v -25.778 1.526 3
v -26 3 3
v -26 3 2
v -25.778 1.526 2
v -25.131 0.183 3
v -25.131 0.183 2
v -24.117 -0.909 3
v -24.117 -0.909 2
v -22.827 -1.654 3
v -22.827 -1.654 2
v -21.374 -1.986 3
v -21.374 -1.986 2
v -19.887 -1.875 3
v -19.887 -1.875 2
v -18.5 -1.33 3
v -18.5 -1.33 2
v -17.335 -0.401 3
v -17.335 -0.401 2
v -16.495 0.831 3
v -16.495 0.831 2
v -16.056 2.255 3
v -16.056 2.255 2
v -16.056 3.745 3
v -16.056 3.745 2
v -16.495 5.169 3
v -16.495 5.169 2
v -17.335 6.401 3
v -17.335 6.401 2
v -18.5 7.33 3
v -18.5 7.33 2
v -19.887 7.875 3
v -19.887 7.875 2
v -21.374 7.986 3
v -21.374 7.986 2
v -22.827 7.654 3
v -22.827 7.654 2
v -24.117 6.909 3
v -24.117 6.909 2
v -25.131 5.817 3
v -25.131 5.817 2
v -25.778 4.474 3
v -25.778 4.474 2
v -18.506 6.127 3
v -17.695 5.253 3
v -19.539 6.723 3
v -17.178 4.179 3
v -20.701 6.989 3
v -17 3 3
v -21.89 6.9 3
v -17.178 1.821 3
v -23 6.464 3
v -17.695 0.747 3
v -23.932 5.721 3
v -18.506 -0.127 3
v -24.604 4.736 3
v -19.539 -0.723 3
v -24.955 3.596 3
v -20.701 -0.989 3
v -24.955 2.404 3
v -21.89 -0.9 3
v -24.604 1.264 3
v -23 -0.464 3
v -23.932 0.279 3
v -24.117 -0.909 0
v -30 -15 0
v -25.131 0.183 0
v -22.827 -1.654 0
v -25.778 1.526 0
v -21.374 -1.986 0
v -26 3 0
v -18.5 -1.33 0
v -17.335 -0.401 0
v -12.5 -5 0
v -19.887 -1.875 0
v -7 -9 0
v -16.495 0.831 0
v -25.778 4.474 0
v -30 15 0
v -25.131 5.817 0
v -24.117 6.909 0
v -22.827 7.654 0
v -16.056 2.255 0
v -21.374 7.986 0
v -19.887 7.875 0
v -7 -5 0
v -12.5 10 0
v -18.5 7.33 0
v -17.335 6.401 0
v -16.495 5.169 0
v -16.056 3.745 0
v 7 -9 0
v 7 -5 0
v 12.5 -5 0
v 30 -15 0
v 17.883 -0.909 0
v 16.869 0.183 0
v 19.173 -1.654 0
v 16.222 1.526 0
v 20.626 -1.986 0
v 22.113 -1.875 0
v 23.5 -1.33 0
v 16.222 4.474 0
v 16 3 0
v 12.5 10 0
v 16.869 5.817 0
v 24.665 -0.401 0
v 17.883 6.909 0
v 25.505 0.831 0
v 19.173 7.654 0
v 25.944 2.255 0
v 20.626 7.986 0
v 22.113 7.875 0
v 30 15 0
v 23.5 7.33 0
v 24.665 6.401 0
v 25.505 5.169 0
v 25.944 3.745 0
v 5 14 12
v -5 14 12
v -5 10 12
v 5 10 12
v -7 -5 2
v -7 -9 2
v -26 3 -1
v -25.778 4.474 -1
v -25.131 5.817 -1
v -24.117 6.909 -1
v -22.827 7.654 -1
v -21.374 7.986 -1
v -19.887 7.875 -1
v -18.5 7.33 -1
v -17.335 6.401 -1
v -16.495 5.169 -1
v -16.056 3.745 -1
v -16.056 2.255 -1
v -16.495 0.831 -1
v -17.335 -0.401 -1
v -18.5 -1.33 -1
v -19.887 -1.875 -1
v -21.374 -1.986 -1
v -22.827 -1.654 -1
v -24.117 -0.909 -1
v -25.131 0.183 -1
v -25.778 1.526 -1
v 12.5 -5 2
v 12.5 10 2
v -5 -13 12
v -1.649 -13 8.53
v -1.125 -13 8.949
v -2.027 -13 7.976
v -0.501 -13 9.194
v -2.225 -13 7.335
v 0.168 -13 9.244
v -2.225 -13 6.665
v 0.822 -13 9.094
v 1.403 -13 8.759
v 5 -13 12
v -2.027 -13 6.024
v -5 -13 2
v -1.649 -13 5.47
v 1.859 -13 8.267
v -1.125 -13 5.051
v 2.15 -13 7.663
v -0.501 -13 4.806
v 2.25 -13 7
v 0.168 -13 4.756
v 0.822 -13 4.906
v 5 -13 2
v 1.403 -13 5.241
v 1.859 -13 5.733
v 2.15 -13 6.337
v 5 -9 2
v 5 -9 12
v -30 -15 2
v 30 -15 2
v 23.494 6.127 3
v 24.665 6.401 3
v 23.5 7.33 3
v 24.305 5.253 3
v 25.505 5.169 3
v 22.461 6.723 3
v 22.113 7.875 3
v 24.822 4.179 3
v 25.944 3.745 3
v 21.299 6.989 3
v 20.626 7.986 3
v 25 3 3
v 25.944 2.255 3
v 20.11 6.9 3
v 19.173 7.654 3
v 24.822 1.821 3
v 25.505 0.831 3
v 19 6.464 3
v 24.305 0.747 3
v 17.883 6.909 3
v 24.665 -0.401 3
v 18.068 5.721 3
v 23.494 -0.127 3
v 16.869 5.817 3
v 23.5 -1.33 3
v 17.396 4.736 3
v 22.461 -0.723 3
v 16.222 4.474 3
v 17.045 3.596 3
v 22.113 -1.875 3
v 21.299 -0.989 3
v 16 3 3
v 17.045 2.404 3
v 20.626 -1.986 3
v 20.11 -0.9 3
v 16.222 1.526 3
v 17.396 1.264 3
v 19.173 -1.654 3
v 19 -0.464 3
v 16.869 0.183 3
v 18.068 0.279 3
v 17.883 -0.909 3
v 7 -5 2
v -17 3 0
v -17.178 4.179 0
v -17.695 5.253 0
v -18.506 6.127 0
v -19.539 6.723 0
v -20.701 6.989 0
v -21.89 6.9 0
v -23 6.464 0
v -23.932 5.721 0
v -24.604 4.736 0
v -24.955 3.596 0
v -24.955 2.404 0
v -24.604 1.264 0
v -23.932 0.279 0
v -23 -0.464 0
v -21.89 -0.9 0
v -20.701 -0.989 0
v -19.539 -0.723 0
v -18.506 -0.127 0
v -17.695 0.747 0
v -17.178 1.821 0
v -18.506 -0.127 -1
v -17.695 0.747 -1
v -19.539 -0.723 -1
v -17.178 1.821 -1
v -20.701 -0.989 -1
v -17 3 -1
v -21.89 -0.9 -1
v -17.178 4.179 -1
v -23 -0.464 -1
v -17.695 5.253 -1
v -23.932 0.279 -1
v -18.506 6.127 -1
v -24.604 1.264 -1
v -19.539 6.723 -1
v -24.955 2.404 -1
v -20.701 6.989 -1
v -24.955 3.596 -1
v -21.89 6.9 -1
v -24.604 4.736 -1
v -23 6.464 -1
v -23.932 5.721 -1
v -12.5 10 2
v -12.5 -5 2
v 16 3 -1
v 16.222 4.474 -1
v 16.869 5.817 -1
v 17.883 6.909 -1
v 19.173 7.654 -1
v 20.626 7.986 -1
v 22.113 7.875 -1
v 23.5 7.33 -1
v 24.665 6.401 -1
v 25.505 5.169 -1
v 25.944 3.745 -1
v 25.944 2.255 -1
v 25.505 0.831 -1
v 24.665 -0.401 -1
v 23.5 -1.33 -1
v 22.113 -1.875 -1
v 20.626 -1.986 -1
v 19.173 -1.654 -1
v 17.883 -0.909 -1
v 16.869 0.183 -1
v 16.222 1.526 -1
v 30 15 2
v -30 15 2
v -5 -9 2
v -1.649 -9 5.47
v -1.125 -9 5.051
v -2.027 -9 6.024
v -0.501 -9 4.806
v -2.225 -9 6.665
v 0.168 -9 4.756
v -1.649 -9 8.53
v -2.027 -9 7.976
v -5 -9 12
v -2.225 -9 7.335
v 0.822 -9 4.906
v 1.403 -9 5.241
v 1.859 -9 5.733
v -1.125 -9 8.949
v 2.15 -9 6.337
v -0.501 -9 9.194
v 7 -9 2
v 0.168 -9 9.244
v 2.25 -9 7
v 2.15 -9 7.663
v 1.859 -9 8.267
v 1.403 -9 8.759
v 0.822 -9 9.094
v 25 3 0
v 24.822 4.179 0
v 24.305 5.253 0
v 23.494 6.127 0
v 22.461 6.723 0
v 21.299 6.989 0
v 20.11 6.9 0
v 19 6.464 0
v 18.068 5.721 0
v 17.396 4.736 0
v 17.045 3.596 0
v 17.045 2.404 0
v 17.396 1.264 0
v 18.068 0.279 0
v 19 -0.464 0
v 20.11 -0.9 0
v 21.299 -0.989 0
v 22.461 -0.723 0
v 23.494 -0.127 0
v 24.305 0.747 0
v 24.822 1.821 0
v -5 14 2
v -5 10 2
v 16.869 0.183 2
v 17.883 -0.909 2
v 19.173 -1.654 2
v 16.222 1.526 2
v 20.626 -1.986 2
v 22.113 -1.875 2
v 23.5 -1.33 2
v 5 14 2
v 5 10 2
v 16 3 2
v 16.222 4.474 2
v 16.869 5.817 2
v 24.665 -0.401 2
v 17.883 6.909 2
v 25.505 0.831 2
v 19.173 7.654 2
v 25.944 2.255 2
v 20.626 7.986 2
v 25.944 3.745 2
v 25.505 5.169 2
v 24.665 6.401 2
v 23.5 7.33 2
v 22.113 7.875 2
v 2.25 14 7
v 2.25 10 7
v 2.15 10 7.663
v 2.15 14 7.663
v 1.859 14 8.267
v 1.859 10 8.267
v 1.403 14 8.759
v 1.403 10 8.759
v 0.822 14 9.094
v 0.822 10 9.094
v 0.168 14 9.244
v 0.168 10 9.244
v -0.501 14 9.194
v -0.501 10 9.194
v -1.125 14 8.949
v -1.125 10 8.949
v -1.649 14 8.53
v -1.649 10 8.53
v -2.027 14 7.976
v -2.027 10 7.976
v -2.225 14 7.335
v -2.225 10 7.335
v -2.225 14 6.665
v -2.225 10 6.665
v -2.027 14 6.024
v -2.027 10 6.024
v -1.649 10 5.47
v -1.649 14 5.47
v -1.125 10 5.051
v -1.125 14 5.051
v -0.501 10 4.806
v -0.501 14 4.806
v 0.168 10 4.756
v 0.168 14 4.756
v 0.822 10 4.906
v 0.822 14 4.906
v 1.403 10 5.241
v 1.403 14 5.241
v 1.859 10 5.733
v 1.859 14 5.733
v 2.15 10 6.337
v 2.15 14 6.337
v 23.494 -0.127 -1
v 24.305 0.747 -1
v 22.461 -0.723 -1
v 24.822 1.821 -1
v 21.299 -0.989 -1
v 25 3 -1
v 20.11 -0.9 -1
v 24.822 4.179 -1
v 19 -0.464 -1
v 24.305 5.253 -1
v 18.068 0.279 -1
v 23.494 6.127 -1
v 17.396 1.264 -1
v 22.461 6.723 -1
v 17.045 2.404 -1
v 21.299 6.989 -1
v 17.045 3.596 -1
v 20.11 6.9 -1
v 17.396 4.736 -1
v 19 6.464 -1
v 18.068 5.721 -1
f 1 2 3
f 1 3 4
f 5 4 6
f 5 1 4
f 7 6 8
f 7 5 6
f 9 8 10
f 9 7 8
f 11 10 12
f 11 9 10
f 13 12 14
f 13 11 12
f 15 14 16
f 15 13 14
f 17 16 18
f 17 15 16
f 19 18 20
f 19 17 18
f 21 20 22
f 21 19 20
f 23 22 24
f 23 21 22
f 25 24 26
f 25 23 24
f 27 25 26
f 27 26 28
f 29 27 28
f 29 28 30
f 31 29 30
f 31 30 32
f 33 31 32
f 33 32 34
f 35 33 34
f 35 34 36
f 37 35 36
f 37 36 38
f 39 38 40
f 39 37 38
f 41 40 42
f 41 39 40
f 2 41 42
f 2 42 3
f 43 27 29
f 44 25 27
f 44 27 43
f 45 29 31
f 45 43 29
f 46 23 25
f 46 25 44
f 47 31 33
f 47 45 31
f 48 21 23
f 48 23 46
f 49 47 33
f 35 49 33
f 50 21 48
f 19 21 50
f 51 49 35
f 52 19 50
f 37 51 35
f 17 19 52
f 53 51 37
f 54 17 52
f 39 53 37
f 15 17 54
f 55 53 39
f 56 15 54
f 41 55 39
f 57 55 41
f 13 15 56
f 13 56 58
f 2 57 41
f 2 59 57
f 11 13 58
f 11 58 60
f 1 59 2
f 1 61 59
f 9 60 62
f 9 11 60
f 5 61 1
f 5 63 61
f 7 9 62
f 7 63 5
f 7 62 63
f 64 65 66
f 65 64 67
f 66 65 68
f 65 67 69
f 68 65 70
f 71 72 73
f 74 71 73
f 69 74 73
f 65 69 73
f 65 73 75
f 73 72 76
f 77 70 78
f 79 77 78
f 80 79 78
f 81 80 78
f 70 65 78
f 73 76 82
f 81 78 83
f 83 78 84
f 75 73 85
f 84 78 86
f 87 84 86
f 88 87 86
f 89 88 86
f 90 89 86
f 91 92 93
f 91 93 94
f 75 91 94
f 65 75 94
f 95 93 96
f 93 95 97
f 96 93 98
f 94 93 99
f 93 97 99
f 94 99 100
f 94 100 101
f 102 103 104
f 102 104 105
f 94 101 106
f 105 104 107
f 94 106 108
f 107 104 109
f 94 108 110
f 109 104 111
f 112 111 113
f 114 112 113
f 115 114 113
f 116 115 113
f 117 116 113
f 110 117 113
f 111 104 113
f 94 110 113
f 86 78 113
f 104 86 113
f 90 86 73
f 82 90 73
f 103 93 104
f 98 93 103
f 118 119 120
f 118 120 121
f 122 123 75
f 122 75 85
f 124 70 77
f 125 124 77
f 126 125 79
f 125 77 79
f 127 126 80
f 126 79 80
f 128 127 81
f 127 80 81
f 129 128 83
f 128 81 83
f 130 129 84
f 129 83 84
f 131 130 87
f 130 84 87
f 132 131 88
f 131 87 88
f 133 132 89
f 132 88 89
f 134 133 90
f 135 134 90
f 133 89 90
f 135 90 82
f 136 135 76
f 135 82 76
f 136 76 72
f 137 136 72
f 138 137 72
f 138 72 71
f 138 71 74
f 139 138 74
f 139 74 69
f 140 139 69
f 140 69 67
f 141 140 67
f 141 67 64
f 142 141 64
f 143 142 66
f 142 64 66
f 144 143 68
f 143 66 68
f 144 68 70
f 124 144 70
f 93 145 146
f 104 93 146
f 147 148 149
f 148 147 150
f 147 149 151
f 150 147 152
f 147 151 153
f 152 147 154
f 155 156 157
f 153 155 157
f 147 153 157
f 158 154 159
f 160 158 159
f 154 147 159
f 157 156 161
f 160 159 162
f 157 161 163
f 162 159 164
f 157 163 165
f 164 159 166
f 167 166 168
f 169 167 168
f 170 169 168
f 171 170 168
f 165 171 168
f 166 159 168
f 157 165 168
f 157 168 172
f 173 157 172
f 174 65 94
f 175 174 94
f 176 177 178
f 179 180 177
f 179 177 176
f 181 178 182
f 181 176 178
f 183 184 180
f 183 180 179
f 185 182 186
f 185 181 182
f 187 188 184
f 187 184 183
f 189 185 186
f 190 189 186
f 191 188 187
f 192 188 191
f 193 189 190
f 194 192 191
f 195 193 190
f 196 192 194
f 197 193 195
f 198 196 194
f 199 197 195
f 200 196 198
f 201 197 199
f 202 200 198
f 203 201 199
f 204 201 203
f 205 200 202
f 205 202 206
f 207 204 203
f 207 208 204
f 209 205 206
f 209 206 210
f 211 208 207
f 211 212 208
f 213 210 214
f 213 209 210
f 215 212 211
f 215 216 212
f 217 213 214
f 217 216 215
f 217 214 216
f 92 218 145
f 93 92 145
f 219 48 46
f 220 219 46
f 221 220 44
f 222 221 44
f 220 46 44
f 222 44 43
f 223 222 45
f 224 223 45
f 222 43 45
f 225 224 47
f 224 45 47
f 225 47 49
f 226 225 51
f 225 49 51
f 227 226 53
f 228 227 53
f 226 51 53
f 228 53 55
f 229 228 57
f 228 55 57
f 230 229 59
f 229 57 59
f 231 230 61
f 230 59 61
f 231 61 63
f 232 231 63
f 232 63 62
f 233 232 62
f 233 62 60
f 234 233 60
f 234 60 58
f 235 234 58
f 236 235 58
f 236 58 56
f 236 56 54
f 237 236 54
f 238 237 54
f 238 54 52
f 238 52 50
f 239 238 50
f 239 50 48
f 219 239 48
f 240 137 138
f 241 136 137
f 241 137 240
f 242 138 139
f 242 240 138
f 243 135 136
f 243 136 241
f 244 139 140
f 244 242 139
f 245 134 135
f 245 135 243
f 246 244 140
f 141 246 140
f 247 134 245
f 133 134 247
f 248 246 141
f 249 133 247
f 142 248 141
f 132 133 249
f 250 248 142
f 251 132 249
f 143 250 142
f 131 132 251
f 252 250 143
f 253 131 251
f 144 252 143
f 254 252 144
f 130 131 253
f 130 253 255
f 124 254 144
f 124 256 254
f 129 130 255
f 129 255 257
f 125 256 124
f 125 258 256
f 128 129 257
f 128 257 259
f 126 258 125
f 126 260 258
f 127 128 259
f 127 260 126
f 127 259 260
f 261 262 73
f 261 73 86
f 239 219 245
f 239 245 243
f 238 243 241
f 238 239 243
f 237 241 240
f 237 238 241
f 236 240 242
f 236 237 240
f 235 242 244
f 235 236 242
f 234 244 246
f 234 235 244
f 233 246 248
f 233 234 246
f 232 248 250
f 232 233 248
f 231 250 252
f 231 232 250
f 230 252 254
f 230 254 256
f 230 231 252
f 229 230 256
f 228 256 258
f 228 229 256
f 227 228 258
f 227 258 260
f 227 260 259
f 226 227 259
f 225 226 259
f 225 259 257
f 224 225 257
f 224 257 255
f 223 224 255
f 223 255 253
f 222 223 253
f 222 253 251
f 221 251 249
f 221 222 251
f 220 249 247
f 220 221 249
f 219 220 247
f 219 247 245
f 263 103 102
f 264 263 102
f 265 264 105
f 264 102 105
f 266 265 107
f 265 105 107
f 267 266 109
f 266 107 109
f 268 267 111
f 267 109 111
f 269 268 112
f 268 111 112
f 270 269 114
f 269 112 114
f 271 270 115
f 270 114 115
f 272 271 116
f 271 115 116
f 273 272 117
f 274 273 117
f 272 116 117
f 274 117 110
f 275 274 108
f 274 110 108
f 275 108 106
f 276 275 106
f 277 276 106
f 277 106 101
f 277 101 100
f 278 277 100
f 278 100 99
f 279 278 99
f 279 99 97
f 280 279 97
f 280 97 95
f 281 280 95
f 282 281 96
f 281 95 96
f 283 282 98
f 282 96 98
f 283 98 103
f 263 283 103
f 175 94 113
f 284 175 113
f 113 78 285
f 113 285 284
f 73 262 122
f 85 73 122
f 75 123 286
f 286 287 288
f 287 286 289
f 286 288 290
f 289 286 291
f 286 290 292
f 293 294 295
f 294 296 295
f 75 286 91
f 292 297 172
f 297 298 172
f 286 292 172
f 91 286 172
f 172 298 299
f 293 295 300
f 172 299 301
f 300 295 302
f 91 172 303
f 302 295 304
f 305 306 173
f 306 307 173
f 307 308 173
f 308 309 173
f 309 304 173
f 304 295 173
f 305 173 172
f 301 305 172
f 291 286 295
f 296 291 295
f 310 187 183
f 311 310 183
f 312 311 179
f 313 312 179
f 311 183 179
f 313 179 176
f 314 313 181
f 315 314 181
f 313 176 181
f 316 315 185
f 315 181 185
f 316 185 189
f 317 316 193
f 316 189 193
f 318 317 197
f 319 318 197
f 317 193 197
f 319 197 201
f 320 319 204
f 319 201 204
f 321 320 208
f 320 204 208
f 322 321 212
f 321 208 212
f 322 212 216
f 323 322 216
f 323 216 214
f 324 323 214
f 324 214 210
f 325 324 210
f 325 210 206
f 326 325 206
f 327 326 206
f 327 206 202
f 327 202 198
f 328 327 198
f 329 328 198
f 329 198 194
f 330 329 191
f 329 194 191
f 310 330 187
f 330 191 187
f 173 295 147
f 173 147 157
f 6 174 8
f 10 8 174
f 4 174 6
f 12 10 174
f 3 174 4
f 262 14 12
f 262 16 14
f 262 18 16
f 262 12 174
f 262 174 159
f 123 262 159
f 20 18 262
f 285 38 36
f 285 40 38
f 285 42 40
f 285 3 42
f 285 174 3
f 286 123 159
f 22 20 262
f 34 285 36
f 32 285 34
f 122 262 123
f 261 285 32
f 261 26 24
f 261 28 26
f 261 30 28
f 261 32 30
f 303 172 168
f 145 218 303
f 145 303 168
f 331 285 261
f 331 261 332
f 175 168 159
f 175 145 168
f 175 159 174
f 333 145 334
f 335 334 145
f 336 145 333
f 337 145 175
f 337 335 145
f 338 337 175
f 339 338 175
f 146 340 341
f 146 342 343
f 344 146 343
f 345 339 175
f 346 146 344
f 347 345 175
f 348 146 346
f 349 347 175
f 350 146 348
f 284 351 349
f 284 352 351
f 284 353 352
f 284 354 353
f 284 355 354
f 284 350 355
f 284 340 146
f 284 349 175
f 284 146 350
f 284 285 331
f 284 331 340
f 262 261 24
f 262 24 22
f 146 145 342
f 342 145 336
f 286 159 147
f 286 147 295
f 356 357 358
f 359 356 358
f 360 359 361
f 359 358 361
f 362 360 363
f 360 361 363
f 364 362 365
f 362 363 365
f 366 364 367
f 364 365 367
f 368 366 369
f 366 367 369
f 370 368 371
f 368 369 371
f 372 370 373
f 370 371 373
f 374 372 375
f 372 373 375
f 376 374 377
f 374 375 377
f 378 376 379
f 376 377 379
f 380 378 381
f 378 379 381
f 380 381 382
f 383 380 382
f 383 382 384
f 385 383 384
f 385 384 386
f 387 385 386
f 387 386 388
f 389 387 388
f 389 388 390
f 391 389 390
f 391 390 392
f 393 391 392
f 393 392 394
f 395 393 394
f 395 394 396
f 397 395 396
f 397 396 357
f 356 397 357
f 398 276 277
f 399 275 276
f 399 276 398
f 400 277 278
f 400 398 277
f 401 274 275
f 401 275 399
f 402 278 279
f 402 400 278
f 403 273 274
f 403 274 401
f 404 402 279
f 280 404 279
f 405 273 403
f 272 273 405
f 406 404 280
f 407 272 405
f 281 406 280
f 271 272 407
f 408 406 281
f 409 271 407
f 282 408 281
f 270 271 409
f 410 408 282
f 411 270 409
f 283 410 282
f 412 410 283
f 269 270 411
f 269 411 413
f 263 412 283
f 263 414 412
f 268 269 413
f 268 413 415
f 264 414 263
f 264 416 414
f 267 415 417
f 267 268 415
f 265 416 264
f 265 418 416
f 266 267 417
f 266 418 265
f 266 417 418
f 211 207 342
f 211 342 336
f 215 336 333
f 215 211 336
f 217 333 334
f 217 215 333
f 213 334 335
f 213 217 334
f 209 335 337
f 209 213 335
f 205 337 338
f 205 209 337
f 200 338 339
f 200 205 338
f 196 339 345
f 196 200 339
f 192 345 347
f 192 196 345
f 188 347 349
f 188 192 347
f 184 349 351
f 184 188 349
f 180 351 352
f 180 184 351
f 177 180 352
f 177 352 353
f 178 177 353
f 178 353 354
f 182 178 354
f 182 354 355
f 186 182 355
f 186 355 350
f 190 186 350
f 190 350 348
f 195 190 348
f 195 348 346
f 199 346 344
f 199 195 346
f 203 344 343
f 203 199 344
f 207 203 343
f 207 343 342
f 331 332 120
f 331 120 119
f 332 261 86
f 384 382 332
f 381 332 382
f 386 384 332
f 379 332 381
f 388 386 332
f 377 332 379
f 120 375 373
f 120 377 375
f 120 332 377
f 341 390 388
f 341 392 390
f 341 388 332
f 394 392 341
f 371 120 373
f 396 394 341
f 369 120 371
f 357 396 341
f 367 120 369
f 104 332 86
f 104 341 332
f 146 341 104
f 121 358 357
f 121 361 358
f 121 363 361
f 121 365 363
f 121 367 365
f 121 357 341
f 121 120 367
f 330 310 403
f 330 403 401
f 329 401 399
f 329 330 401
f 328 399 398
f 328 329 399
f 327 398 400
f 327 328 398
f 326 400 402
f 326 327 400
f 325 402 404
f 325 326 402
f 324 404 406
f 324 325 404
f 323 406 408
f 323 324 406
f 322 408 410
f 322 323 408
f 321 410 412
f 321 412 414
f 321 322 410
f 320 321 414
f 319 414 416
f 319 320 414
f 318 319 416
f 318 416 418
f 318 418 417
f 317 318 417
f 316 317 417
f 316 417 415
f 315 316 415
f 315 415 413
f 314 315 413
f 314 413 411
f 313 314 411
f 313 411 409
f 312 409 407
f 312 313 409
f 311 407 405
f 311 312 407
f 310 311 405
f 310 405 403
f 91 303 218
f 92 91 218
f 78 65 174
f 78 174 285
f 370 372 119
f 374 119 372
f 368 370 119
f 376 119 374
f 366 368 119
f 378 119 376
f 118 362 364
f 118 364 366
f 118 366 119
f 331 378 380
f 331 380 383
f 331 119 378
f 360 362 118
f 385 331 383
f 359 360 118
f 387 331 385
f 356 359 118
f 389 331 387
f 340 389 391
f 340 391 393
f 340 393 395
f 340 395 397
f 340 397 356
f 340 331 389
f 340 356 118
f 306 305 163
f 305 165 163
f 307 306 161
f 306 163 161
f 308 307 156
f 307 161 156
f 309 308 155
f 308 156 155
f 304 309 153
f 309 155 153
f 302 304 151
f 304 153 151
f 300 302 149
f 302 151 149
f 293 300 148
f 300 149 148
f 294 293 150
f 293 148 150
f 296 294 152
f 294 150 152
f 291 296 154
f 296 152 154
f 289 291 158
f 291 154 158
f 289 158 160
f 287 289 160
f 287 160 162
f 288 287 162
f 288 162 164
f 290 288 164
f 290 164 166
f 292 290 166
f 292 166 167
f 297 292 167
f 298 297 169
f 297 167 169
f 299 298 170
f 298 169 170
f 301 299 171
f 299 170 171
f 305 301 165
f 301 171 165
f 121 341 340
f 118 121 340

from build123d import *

# Parameters (mm, degrees)
SKETCH1_W           = 60
SKETCH1_H           = 30
BOSS_EXTRUDE1_DEPTH = 2
SKETCH2_R           = 4
CUT_EXTRUDE1_DEPTH  = 13
SKETCH3_W           = 25
SKETCH3_H           = 15
CUT_EXTRUDE2_DEPTH  = 34.600595233
BOSS_EXTRUDE2_START = 1
SKETCH5_R           = 5
SKETCH5_R_2         = 4
BOSS_EXTRUDE2_DEPTH = 1
SKETCH7_R           = 5
SKETCH7_R_2         = 4
BOSS_EXTRUDE3_DEPTH = 1
SKETCH9_W           = 10
SKETCH9_H           = 4
BOSS_EXTRUDE4_DEPTH = 10
SKETCH10_R          = 2.25
CUT_EXTRUDE3_DEPTH  = 41.853396432
SKETCH11_R          = 2.25
CUT_EXTRUDE4_DEPTH  = 43.755116653
SKETCH13_W          = 14
SKETCH13_H          = 4
CUT_EXTRUDE6_DEPTH  = 36


with BuildPart() as part:
    # Sketch1 → Boss-Extrude1 (new body)
    with BuildSketch(Plane.XY):
        Rectangle(SKETCH1_W, SKETCH1_H)
    extrude(amount=BOSS_EXTRUDE1_DEPTH)

    # Sketch2 → Cut-Extrude1 (cut)
    with BuildSketch(Plane.XY.offset(2)):
        with Locations((-21, 3)):
            Circle(SKETCH2_R)
        with Locations((21, 3)):
            Circle(SKETCH2_R)
    extrude(amount=-CUT_EXTRUDE1_DEPTH, mode=Mode.SUBTRACT)

    # Sketch3 → Cut-Extrude2 (cut, through all)
    with BuildSketch(Plane.XY.offset(2)):
        with Locations((0, 2.5)):
            Rectangle(SKETCH3_W, SKETCH3_H)
    extrude(amount=-CUT_EXTRUDE2_DEPTH, mode=Mode.SUBTRACT)

    # Sketch5 → Boss-Extrude2 (add)
    # profile 1 of 2: a face of its own
    with BuildSketch(Plane.XY.offset(2).offset(BOSS_EXTRUDE2_START)):
        with Locations(Location((-21, 3, 0), (0, 0, 180))):
            Circle(SKETCH5_R)
        with Locations((-21, 3)):
            Circle(SKETCH5_R_2, mode=Mode.SUBTRACT)
    # profile 2 of 2: a face of its own
    with BuildSketch(Plane.XY.offset(2).offset(BOSS_EXTRUDE2_START)):
        with Locations(Location((21, 3, 0), (0, 0, 180))):
            Circle(SKETCH5_R)
        with Locations((21, 3)):
            Circle(SKETCH5_R_2, mode=Mode.SUBTRACT)
    extrude(amount=-BOSS_EXTRUDE2_DEPTH)

    # Sketch7 → Boss-Extrude3 (add)
    # profile 1 of 2: a face of its own
    with BuildSketch(Plane(origin=(0, 0, 0), x_dir=(-1, 0, 0), z_dir=(0, 0, -1))):
        with Locations((-21, 3)):
            Circle(SKETCH7_R)
        with Locations(Location((-21, 3, 0), (0, 0, 180))):
            Circle(SKETCH7_R_2, mode=Mode.SUBTRACT)
    # profile 2 of 2: a face of its own
    with BuildSketch(Plane(origin=(0, 0, 0), x_dir=(-1, 0, 0), z_dir=(0, 0, -1))):
        with Locations((21, 3)):
            Circle(SKETCH7_R)
        with Locations(Location((21, 3, 0), (0, 0, 180))):
            Circle(SKETCH7_R_2, mode=Mode.SUBTRACT)
    extrude(amount=BOSS_EXTRUDE3_DEPTH)

    # Sketch9 → Boss-Extrude4 (add)
    with BuildSketch(Plane.XY.offset(2)):
        with Locations((0, -11)):
            Rectangle(SKETCH9_W, SKETCH9_H)
        with Locations((0, 12)):
            Rectangle(SKETCH9_W, SKETCH9_H)
    extrude(amount=BOSS_EXTRUDE4_DEPTH)

    # Sketch10 → Cut-Extrude3 (cut, through all)
    with BuildSketch(Plane.XZ.offset(-10)):
        with Locations((0, 7)):
            Circle(SKETCH10_R)
    extrude(amount=-CUT_EXTRUDE3_DEPTH, mode=Mode.SUBTRACT)

    # Sketch11 → Cut-Extrude4 (cut, through all)
    with BuildSketch(Plane.XZ.offset(13)):
        with Locations((0, 7)):
            Circle(SKETCH11_R)
    extrude(amount=-CUT_EXTRUDE4_DEPTH, mode=Mode.SUBTRACT)

    # Sketch13 → Cut-Extrude6 (cut, through all)
    with BuildSketch(Plane.XY.offset(2)):
        with Locations((0, -7)):
            Rectangle(SKETCH13_W, SKETCH13_H)
    extrude(amount=-CUT_EXTRUDE6_DEPTH, mode=Mode.SUBTRACT)


solid = part.part
